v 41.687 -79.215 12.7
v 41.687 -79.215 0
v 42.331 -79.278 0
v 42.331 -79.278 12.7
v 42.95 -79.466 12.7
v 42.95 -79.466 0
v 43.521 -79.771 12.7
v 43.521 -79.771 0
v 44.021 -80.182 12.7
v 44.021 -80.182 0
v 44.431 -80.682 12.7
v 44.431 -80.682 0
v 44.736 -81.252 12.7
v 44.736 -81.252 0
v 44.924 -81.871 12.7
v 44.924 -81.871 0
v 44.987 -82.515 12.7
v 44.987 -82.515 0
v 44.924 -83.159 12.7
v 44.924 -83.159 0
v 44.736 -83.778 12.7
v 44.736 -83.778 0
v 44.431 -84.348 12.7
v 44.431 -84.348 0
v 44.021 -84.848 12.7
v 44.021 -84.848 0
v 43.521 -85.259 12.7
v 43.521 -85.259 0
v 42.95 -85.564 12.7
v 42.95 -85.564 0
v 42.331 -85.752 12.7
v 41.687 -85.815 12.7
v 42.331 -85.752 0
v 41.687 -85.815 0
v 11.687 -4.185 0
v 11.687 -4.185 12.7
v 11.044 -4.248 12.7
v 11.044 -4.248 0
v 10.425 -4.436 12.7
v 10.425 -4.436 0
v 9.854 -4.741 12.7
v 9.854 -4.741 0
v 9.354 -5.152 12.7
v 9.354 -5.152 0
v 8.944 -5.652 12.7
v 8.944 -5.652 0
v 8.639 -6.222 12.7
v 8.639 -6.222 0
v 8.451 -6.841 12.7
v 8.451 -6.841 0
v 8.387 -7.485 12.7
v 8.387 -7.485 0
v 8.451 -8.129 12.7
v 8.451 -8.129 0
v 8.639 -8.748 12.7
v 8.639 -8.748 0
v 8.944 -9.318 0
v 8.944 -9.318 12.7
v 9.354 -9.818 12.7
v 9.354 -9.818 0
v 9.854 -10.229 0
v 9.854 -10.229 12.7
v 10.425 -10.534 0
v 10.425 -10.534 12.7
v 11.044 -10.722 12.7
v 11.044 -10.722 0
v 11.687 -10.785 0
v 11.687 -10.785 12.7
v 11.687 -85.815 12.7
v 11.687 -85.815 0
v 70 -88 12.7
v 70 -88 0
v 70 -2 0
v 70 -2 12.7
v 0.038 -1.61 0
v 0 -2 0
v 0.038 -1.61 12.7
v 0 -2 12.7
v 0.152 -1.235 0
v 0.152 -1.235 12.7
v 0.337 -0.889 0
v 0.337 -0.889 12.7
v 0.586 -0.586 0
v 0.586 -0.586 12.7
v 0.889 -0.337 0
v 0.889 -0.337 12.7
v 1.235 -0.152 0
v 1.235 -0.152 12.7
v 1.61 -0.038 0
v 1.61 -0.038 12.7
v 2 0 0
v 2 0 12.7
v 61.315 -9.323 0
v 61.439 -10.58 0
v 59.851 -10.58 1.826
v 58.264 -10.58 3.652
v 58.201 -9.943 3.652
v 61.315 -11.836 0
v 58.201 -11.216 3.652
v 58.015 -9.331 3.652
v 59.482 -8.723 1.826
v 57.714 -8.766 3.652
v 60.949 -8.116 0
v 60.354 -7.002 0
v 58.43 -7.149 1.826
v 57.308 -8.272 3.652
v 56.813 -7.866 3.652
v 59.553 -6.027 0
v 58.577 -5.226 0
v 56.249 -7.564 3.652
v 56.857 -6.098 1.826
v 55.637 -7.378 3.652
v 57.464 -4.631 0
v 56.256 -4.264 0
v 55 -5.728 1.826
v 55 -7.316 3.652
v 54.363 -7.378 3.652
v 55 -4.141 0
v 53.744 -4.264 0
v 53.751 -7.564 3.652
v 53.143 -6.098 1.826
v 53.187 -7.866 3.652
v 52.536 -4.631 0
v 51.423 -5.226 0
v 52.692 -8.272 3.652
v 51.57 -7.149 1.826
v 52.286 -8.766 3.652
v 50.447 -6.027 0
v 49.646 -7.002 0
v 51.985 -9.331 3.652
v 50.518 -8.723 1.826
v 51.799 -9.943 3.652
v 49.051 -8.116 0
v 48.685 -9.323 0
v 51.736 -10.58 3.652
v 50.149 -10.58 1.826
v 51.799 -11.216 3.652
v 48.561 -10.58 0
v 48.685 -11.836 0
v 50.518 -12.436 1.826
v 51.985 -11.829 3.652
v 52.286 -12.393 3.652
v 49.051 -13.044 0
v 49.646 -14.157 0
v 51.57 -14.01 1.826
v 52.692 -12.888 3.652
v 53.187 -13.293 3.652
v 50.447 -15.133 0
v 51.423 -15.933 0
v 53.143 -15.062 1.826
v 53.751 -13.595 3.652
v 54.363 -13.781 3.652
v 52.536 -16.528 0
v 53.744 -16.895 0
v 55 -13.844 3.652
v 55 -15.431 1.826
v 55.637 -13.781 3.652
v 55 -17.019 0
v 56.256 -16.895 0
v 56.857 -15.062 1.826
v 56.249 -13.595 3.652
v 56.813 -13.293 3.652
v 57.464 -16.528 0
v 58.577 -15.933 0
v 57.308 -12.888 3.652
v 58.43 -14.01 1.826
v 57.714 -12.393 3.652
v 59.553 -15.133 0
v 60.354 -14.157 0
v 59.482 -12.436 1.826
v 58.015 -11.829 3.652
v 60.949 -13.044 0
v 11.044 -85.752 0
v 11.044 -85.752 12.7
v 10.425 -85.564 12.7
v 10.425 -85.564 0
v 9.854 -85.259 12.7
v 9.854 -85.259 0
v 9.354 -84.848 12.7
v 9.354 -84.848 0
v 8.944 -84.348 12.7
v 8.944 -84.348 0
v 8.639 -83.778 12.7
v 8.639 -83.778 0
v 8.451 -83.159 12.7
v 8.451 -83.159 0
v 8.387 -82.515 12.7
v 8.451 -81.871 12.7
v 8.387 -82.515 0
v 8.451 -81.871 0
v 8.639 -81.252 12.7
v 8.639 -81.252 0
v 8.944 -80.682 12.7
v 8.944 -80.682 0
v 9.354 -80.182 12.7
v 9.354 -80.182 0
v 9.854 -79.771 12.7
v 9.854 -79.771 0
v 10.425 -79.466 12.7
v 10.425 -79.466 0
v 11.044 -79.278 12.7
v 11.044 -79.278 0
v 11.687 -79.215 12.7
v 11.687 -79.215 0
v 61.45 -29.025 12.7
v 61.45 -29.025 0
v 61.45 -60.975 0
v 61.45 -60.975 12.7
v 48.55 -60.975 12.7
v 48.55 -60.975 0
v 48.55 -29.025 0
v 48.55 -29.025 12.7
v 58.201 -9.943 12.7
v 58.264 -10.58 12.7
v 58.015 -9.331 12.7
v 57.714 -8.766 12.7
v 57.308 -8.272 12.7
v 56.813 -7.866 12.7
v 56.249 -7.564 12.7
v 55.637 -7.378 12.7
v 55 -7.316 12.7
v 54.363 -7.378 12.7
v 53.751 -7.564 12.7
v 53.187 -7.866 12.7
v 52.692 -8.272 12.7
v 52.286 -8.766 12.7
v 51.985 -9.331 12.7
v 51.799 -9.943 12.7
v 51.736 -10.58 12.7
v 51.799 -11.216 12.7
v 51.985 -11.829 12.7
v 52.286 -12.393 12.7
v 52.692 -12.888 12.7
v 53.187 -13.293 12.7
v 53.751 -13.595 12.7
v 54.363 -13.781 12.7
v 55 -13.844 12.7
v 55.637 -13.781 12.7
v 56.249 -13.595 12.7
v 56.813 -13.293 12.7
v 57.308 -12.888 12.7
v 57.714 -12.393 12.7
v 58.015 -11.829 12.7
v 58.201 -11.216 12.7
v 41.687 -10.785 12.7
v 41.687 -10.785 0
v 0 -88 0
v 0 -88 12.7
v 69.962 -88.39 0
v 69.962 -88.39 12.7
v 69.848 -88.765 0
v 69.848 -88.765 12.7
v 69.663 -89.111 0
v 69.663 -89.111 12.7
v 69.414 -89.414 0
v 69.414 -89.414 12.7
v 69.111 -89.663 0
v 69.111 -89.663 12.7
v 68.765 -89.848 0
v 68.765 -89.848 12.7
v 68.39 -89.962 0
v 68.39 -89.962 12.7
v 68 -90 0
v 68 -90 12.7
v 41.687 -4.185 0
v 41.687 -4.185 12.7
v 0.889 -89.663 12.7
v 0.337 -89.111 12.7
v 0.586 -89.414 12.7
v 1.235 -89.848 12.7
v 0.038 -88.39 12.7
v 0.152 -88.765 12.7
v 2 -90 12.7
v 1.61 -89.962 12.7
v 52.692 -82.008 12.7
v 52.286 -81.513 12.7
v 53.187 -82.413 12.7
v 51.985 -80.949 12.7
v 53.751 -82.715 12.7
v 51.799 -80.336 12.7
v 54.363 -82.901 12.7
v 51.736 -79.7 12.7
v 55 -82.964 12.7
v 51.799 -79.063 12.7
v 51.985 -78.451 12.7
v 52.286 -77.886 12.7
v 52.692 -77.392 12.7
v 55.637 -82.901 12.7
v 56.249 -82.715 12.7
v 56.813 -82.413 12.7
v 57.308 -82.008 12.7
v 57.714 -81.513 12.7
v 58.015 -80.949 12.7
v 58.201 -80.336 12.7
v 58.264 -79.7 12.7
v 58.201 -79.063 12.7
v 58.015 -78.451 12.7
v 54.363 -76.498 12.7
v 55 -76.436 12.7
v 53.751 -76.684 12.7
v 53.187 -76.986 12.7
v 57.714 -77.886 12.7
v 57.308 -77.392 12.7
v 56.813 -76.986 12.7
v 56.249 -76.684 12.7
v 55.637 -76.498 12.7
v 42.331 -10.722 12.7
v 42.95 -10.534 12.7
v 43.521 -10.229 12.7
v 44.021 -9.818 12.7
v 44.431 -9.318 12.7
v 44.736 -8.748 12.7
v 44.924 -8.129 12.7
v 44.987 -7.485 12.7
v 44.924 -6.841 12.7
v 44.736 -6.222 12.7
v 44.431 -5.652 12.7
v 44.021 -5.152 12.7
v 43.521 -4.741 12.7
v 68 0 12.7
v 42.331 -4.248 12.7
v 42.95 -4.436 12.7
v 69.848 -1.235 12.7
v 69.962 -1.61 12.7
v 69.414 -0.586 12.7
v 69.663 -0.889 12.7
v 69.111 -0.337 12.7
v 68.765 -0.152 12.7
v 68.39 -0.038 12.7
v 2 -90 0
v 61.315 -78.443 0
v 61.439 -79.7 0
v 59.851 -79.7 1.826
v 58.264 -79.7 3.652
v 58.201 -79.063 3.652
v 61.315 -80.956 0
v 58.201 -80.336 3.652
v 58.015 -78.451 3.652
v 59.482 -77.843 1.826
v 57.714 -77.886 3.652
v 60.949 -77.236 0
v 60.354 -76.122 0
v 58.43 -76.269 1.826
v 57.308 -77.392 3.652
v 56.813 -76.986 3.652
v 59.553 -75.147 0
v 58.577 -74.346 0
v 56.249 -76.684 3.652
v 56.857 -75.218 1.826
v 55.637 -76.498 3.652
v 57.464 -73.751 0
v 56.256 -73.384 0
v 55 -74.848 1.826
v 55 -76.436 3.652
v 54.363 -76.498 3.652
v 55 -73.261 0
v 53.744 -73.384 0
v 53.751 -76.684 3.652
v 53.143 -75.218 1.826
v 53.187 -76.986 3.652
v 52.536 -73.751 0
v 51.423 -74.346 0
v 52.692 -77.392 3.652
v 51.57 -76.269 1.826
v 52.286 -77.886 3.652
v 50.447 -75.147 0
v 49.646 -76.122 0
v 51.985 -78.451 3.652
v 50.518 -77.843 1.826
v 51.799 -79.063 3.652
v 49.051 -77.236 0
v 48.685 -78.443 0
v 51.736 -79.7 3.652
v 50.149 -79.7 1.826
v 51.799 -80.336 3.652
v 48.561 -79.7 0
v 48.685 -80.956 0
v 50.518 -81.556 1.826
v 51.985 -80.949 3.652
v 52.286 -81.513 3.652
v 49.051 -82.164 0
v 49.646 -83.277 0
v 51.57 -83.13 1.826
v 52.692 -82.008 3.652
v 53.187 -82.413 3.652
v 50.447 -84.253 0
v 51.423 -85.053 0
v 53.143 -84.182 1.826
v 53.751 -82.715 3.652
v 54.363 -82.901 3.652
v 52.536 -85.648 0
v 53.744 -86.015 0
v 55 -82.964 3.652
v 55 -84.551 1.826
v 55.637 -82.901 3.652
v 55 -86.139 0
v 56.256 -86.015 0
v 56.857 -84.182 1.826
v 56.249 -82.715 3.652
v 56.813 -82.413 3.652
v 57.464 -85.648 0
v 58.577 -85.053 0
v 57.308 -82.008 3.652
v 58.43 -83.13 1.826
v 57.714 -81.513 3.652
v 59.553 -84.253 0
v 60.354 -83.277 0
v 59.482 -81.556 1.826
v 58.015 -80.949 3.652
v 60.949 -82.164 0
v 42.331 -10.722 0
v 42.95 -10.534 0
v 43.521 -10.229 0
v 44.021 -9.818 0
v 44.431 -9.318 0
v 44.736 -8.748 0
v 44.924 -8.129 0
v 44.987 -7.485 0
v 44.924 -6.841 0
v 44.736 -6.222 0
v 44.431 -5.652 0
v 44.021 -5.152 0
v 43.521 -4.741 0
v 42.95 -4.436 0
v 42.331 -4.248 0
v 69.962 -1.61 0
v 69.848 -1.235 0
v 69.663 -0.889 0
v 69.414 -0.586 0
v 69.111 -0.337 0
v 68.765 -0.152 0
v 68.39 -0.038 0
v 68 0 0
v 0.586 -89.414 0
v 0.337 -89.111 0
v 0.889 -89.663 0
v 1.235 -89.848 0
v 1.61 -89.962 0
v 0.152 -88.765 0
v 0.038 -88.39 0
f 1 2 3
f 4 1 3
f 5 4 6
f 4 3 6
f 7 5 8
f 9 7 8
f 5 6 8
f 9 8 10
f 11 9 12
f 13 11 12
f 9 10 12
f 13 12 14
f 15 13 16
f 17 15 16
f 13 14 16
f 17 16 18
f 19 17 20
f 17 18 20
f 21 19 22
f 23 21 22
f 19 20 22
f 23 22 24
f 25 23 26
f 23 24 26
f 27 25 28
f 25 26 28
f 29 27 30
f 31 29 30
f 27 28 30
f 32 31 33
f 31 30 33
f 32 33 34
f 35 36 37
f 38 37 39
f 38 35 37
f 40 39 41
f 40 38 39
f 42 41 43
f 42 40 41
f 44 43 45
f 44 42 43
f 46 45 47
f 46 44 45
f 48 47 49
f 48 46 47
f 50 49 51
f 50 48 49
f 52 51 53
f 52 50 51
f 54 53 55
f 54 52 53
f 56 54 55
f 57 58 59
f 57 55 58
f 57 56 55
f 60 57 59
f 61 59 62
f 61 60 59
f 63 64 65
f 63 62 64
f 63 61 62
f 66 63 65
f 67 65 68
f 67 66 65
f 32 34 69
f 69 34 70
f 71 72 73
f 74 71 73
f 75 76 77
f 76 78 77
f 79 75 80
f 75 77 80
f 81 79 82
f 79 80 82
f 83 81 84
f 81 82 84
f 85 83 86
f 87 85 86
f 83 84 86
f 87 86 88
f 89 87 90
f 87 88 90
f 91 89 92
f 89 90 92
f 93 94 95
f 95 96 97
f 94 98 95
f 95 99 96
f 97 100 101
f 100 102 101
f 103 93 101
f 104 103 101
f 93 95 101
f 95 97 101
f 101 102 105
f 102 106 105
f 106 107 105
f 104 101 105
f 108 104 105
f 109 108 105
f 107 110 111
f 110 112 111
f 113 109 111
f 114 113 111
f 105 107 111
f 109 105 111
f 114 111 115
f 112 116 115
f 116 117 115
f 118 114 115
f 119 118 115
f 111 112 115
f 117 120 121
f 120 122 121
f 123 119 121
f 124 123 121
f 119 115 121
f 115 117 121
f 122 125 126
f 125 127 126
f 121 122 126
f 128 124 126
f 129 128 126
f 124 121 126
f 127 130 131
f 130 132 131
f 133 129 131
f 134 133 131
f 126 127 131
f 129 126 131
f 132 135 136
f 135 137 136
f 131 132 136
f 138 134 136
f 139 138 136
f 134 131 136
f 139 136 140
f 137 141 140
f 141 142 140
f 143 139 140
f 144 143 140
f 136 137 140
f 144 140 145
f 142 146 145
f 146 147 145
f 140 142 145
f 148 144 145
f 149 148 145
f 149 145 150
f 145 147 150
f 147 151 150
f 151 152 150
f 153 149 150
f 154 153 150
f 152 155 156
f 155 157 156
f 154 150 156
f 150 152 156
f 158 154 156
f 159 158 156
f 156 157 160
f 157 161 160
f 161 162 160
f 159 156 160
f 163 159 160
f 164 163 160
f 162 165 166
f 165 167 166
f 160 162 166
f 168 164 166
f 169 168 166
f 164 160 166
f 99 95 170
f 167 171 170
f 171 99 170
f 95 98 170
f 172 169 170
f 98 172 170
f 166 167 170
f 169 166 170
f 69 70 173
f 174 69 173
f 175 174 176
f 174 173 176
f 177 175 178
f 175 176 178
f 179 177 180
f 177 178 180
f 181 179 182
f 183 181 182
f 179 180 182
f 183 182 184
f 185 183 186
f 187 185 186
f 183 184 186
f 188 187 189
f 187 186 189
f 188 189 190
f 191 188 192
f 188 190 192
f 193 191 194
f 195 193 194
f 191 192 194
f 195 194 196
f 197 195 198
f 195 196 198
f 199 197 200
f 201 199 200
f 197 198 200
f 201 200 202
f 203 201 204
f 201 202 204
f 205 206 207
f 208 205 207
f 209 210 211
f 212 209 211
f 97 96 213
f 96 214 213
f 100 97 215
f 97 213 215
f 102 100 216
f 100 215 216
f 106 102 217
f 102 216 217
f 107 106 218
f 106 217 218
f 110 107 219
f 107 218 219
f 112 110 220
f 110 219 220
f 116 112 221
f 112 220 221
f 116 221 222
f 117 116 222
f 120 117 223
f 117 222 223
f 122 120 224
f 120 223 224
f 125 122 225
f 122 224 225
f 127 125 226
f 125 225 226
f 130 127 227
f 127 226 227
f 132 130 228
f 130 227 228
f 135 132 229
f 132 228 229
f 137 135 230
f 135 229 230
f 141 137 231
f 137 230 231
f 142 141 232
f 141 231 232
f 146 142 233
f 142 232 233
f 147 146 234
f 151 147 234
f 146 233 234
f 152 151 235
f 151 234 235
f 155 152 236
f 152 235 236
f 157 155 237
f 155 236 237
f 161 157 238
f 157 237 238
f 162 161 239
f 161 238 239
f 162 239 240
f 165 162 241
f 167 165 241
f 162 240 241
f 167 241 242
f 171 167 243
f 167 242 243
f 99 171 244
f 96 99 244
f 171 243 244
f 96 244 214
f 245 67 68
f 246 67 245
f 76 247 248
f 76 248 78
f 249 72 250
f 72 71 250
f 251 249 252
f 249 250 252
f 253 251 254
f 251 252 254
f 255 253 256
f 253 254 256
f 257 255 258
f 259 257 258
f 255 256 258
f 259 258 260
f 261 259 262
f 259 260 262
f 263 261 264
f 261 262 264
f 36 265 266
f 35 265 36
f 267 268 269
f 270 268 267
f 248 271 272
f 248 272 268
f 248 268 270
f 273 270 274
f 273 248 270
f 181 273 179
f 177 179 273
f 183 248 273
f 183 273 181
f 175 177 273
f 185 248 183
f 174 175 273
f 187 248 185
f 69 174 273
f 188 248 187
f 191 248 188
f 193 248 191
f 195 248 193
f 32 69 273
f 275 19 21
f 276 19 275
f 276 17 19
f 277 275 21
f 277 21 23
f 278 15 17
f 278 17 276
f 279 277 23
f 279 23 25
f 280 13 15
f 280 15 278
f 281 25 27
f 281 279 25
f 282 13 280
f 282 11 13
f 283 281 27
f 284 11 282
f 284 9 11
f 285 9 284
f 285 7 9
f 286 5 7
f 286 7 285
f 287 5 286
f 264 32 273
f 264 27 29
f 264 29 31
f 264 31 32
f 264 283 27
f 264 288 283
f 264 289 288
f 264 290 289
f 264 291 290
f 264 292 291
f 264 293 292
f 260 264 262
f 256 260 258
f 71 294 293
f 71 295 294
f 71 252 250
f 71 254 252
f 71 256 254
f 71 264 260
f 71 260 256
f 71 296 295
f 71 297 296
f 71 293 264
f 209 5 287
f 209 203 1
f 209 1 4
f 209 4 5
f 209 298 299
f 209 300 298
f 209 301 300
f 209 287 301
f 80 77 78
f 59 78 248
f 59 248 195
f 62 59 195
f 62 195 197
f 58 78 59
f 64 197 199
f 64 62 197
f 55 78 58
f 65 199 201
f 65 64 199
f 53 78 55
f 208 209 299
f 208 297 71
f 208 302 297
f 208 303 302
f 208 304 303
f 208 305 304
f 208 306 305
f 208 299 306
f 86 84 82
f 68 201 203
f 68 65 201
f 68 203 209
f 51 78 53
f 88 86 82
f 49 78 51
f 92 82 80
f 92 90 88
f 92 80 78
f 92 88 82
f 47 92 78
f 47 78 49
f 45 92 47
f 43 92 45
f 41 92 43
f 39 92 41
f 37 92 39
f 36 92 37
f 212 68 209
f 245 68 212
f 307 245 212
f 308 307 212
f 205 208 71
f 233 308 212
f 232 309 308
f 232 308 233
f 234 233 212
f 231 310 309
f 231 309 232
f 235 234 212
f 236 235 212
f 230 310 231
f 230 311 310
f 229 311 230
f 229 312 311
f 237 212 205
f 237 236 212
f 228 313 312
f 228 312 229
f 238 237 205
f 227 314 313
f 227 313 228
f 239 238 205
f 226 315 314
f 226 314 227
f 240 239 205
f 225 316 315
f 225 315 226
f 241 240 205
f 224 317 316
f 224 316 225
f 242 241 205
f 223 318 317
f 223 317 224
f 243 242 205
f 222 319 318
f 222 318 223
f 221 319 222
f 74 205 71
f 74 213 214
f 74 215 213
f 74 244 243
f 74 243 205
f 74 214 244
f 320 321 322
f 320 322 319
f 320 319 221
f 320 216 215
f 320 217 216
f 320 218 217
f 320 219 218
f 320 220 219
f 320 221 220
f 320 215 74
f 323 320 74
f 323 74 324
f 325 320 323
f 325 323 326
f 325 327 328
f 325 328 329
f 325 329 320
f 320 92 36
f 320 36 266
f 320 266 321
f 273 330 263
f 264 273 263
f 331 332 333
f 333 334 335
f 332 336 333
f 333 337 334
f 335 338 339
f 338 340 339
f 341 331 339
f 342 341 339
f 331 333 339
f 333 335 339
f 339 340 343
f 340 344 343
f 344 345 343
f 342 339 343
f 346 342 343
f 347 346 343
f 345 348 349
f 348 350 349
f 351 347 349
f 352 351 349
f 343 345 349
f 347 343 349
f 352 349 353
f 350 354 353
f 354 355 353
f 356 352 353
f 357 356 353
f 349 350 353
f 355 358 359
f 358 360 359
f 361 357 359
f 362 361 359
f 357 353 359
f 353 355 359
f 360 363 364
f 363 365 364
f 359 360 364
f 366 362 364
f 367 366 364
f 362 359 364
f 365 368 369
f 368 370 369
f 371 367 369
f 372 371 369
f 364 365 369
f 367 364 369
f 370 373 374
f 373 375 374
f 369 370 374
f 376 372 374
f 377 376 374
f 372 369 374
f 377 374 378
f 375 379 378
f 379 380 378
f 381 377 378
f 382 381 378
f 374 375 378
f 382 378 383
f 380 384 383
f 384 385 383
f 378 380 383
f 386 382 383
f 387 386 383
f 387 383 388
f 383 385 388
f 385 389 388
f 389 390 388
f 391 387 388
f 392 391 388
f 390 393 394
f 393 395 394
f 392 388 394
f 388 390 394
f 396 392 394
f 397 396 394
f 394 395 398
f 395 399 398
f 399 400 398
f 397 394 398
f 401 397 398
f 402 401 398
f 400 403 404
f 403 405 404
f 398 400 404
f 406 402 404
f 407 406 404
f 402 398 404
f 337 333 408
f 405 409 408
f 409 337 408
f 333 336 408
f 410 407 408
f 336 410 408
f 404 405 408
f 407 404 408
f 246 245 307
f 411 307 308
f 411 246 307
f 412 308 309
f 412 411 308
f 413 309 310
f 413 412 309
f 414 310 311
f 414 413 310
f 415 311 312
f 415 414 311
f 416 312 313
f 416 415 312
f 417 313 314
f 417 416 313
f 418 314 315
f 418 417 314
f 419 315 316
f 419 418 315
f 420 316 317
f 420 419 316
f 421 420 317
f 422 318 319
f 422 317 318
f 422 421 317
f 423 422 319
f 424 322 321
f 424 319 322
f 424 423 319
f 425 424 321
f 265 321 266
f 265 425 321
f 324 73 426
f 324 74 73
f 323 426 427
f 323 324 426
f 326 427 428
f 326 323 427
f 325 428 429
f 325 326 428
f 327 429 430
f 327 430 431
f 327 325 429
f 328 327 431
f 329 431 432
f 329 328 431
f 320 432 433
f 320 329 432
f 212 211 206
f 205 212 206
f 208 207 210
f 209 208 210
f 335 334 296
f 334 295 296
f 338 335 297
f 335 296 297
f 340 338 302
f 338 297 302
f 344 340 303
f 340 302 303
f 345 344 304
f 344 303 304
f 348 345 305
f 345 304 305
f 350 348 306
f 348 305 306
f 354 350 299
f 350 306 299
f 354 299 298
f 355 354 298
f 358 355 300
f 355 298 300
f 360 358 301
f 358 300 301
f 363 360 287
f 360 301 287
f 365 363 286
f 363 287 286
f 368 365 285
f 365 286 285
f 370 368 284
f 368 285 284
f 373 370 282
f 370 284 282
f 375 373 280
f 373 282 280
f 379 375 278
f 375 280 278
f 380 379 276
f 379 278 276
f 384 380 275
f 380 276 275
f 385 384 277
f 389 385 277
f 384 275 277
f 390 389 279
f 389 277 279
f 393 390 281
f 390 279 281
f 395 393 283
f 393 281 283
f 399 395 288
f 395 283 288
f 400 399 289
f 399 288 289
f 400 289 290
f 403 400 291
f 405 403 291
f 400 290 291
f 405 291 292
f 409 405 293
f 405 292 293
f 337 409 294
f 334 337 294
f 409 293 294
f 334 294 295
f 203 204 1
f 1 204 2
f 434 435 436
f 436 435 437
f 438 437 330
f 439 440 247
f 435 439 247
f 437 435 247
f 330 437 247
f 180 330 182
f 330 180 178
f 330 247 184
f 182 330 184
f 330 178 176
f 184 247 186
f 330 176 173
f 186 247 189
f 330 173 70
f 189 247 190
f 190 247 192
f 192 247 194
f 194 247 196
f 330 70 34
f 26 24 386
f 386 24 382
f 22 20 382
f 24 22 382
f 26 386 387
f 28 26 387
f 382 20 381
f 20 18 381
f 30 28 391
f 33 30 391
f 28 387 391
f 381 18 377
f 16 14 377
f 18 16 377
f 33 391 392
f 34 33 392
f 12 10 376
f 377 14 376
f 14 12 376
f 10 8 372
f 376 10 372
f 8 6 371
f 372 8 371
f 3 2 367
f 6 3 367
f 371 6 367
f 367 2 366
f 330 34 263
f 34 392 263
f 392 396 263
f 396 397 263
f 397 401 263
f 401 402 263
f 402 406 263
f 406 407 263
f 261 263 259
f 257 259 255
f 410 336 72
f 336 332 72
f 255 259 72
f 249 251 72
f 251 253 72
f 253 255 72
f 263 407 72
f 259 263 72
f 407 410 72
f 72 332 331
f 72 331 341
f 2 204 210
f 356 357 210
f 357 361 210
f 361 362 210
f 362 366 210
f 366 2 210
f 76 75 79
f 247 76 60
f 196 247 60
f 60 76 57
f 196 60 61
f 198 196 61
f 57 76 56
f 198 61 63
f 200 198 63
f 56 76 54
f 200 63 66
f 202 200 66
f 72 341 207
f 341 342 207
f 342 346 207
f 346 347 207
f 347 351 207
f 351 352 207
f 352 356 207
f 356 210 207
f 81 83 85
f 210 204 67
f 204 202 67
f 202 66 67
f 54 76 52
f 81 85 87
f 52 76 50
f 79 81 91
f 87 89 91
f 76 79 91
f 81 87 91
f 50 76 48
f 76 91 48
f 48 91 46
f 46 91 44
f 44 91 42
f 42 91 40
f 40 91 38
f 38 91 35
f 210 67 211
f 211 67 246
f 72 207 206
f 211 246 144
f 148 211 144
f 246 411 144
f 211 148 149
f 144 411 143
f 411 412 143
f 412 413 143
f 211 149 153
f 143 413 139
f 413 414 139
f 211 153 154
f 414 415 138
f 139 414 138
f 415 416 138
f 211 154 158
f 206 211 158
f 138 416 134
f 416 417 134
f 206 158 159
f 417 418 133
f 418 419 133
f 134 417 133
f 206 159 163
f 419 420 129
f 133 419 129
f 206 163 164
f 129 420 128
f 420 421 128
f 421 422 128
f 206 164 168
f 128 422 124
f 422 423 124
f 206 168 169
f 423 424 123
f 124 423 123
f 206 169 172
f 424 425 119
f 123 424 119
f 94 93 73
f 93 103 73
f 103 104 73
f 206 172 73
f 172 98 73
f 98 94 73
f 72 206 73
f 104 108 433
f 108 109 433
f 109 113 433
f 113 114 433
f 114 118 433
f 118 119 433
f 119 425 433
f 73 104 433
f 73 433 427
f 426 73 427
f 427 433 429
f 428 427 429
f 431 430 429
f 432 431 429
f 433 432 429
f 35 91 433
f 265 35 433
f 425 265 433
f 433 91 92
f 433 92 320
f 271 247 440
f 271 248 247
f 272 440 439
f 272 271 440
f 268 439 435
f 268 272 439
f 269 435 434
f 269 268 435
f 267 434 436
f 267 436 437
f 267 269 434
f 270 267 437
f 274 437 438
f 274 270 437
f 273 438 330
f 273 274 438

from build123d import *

# Parameters (mm, degrees)
SKETCH1_W                                        = 70
SKETCH1_H                                        = 90
BOSS_EXTRUDE1_DEPTH                              = 12.7
CSK_FOR_1_4_FLAT_HEAD_MACHINE_SCREW1_D           = 6.5278
CSK_FOR_1_4_FLAT_HEAD_MACHINE_SCREW1_CSINK_D     = 12.8778
CSK_FOR_1_4_FLAT_HEAD_MACHINE_SCREW1_CSINK_ANGLE = 82
FILLET1_R                                        = 2
CUT_EXTRUDE1_DEPTH                               = 115.72266559


with BuildPart() as part:
    # Sketch1 → Boss-Extrude1 (new body)
    with BuildSketch(Plane.XY):
        with Locations((35, -45)):
            Rectangle(SKETCH1_W, SKETCH1_H)
        Polygon((55, -29.025), (61.45, -29.025), (61.45, -60.975), (55, -60.975), (48.55, -60.975), (48.55, -29.025), align=None, mode=Mode.SUBTRACT)
    extrude(amount=BOSS_EXTRUDE1_DEPTH)

    # CSK for 1/4 Flat Head Machine Screw1 (through all)
    with Locations(Plane(origin=(0, 0, 0), x_dir=(-1, 0, 0), z_dir=(0, 0, -1))):
        with Locations((-55, -10.579610023), (-55, -79.699610023)):
            CounterSinkHole(CSK_FOR_1_4_FLAT_HEAD_MACHINE_SCREW1_D / 2, CSK_FOR_1_4_FLAT_HEAD_MACHINE_SCREW1_CSINK_D / 2, counter_sink_angle=CSK_FOR_1_4_FLAT_HEAD_MACHINE_SCREW1_CSINK_ANGLE)

    # Fillet1
    fillet1_edges = [part.edges().sort_by_distance(p)[0] for p in [
        (0, 0, 6.35),
        (70, 0, 6.35),
        (70, -90, 6.35),
        (0, -90, 6.35),
    ]]
    fillet(fillet1_edges, radius=FILLET1_R)

    # Sketch7 → Cut-Extrude1 (cut, through all)
    with BuildSketch(Plane(origin=(0, 0, 0), x_dir=(-1, 0, 0), z_dir=(0, 0, -1))):
        with BuildLine():
            Line((-41.687469931, -85.815), (-11.687469931, -85.815))
            ThreePointArc((-11.687469931, -85.815), (-8.387469931, -82.515), (-11.687469931, -79.215))
            Line((-11.687469931, -79.215), (-41.687469931, -79.215))
            ThreePointArc((-41.687469931, -79.215), (-44.987469931, -82.515), (-41.687469931, -85.815))
        make_face()
        with BuildLine():
            Line((-11.687469931, -10.785), (-41.687469931, -10.785))
            ThreePointArc((-41.687469931, -10.785), (-44.987469931, -7.485), (-41.687469931, -4.185))
            Line((-41.687469931, -4.185), (-11.687469931, -4.185))
            ThreePointArc((-11.687469931, -4.185), (-8.387469931, -7.485), (-11.687469931, -10.785))
        make_face()
    extrude(amount=-CUT_EXTRUDE1_DEPTH, mode=Mode.SUBTRACT)


solid = part.part
